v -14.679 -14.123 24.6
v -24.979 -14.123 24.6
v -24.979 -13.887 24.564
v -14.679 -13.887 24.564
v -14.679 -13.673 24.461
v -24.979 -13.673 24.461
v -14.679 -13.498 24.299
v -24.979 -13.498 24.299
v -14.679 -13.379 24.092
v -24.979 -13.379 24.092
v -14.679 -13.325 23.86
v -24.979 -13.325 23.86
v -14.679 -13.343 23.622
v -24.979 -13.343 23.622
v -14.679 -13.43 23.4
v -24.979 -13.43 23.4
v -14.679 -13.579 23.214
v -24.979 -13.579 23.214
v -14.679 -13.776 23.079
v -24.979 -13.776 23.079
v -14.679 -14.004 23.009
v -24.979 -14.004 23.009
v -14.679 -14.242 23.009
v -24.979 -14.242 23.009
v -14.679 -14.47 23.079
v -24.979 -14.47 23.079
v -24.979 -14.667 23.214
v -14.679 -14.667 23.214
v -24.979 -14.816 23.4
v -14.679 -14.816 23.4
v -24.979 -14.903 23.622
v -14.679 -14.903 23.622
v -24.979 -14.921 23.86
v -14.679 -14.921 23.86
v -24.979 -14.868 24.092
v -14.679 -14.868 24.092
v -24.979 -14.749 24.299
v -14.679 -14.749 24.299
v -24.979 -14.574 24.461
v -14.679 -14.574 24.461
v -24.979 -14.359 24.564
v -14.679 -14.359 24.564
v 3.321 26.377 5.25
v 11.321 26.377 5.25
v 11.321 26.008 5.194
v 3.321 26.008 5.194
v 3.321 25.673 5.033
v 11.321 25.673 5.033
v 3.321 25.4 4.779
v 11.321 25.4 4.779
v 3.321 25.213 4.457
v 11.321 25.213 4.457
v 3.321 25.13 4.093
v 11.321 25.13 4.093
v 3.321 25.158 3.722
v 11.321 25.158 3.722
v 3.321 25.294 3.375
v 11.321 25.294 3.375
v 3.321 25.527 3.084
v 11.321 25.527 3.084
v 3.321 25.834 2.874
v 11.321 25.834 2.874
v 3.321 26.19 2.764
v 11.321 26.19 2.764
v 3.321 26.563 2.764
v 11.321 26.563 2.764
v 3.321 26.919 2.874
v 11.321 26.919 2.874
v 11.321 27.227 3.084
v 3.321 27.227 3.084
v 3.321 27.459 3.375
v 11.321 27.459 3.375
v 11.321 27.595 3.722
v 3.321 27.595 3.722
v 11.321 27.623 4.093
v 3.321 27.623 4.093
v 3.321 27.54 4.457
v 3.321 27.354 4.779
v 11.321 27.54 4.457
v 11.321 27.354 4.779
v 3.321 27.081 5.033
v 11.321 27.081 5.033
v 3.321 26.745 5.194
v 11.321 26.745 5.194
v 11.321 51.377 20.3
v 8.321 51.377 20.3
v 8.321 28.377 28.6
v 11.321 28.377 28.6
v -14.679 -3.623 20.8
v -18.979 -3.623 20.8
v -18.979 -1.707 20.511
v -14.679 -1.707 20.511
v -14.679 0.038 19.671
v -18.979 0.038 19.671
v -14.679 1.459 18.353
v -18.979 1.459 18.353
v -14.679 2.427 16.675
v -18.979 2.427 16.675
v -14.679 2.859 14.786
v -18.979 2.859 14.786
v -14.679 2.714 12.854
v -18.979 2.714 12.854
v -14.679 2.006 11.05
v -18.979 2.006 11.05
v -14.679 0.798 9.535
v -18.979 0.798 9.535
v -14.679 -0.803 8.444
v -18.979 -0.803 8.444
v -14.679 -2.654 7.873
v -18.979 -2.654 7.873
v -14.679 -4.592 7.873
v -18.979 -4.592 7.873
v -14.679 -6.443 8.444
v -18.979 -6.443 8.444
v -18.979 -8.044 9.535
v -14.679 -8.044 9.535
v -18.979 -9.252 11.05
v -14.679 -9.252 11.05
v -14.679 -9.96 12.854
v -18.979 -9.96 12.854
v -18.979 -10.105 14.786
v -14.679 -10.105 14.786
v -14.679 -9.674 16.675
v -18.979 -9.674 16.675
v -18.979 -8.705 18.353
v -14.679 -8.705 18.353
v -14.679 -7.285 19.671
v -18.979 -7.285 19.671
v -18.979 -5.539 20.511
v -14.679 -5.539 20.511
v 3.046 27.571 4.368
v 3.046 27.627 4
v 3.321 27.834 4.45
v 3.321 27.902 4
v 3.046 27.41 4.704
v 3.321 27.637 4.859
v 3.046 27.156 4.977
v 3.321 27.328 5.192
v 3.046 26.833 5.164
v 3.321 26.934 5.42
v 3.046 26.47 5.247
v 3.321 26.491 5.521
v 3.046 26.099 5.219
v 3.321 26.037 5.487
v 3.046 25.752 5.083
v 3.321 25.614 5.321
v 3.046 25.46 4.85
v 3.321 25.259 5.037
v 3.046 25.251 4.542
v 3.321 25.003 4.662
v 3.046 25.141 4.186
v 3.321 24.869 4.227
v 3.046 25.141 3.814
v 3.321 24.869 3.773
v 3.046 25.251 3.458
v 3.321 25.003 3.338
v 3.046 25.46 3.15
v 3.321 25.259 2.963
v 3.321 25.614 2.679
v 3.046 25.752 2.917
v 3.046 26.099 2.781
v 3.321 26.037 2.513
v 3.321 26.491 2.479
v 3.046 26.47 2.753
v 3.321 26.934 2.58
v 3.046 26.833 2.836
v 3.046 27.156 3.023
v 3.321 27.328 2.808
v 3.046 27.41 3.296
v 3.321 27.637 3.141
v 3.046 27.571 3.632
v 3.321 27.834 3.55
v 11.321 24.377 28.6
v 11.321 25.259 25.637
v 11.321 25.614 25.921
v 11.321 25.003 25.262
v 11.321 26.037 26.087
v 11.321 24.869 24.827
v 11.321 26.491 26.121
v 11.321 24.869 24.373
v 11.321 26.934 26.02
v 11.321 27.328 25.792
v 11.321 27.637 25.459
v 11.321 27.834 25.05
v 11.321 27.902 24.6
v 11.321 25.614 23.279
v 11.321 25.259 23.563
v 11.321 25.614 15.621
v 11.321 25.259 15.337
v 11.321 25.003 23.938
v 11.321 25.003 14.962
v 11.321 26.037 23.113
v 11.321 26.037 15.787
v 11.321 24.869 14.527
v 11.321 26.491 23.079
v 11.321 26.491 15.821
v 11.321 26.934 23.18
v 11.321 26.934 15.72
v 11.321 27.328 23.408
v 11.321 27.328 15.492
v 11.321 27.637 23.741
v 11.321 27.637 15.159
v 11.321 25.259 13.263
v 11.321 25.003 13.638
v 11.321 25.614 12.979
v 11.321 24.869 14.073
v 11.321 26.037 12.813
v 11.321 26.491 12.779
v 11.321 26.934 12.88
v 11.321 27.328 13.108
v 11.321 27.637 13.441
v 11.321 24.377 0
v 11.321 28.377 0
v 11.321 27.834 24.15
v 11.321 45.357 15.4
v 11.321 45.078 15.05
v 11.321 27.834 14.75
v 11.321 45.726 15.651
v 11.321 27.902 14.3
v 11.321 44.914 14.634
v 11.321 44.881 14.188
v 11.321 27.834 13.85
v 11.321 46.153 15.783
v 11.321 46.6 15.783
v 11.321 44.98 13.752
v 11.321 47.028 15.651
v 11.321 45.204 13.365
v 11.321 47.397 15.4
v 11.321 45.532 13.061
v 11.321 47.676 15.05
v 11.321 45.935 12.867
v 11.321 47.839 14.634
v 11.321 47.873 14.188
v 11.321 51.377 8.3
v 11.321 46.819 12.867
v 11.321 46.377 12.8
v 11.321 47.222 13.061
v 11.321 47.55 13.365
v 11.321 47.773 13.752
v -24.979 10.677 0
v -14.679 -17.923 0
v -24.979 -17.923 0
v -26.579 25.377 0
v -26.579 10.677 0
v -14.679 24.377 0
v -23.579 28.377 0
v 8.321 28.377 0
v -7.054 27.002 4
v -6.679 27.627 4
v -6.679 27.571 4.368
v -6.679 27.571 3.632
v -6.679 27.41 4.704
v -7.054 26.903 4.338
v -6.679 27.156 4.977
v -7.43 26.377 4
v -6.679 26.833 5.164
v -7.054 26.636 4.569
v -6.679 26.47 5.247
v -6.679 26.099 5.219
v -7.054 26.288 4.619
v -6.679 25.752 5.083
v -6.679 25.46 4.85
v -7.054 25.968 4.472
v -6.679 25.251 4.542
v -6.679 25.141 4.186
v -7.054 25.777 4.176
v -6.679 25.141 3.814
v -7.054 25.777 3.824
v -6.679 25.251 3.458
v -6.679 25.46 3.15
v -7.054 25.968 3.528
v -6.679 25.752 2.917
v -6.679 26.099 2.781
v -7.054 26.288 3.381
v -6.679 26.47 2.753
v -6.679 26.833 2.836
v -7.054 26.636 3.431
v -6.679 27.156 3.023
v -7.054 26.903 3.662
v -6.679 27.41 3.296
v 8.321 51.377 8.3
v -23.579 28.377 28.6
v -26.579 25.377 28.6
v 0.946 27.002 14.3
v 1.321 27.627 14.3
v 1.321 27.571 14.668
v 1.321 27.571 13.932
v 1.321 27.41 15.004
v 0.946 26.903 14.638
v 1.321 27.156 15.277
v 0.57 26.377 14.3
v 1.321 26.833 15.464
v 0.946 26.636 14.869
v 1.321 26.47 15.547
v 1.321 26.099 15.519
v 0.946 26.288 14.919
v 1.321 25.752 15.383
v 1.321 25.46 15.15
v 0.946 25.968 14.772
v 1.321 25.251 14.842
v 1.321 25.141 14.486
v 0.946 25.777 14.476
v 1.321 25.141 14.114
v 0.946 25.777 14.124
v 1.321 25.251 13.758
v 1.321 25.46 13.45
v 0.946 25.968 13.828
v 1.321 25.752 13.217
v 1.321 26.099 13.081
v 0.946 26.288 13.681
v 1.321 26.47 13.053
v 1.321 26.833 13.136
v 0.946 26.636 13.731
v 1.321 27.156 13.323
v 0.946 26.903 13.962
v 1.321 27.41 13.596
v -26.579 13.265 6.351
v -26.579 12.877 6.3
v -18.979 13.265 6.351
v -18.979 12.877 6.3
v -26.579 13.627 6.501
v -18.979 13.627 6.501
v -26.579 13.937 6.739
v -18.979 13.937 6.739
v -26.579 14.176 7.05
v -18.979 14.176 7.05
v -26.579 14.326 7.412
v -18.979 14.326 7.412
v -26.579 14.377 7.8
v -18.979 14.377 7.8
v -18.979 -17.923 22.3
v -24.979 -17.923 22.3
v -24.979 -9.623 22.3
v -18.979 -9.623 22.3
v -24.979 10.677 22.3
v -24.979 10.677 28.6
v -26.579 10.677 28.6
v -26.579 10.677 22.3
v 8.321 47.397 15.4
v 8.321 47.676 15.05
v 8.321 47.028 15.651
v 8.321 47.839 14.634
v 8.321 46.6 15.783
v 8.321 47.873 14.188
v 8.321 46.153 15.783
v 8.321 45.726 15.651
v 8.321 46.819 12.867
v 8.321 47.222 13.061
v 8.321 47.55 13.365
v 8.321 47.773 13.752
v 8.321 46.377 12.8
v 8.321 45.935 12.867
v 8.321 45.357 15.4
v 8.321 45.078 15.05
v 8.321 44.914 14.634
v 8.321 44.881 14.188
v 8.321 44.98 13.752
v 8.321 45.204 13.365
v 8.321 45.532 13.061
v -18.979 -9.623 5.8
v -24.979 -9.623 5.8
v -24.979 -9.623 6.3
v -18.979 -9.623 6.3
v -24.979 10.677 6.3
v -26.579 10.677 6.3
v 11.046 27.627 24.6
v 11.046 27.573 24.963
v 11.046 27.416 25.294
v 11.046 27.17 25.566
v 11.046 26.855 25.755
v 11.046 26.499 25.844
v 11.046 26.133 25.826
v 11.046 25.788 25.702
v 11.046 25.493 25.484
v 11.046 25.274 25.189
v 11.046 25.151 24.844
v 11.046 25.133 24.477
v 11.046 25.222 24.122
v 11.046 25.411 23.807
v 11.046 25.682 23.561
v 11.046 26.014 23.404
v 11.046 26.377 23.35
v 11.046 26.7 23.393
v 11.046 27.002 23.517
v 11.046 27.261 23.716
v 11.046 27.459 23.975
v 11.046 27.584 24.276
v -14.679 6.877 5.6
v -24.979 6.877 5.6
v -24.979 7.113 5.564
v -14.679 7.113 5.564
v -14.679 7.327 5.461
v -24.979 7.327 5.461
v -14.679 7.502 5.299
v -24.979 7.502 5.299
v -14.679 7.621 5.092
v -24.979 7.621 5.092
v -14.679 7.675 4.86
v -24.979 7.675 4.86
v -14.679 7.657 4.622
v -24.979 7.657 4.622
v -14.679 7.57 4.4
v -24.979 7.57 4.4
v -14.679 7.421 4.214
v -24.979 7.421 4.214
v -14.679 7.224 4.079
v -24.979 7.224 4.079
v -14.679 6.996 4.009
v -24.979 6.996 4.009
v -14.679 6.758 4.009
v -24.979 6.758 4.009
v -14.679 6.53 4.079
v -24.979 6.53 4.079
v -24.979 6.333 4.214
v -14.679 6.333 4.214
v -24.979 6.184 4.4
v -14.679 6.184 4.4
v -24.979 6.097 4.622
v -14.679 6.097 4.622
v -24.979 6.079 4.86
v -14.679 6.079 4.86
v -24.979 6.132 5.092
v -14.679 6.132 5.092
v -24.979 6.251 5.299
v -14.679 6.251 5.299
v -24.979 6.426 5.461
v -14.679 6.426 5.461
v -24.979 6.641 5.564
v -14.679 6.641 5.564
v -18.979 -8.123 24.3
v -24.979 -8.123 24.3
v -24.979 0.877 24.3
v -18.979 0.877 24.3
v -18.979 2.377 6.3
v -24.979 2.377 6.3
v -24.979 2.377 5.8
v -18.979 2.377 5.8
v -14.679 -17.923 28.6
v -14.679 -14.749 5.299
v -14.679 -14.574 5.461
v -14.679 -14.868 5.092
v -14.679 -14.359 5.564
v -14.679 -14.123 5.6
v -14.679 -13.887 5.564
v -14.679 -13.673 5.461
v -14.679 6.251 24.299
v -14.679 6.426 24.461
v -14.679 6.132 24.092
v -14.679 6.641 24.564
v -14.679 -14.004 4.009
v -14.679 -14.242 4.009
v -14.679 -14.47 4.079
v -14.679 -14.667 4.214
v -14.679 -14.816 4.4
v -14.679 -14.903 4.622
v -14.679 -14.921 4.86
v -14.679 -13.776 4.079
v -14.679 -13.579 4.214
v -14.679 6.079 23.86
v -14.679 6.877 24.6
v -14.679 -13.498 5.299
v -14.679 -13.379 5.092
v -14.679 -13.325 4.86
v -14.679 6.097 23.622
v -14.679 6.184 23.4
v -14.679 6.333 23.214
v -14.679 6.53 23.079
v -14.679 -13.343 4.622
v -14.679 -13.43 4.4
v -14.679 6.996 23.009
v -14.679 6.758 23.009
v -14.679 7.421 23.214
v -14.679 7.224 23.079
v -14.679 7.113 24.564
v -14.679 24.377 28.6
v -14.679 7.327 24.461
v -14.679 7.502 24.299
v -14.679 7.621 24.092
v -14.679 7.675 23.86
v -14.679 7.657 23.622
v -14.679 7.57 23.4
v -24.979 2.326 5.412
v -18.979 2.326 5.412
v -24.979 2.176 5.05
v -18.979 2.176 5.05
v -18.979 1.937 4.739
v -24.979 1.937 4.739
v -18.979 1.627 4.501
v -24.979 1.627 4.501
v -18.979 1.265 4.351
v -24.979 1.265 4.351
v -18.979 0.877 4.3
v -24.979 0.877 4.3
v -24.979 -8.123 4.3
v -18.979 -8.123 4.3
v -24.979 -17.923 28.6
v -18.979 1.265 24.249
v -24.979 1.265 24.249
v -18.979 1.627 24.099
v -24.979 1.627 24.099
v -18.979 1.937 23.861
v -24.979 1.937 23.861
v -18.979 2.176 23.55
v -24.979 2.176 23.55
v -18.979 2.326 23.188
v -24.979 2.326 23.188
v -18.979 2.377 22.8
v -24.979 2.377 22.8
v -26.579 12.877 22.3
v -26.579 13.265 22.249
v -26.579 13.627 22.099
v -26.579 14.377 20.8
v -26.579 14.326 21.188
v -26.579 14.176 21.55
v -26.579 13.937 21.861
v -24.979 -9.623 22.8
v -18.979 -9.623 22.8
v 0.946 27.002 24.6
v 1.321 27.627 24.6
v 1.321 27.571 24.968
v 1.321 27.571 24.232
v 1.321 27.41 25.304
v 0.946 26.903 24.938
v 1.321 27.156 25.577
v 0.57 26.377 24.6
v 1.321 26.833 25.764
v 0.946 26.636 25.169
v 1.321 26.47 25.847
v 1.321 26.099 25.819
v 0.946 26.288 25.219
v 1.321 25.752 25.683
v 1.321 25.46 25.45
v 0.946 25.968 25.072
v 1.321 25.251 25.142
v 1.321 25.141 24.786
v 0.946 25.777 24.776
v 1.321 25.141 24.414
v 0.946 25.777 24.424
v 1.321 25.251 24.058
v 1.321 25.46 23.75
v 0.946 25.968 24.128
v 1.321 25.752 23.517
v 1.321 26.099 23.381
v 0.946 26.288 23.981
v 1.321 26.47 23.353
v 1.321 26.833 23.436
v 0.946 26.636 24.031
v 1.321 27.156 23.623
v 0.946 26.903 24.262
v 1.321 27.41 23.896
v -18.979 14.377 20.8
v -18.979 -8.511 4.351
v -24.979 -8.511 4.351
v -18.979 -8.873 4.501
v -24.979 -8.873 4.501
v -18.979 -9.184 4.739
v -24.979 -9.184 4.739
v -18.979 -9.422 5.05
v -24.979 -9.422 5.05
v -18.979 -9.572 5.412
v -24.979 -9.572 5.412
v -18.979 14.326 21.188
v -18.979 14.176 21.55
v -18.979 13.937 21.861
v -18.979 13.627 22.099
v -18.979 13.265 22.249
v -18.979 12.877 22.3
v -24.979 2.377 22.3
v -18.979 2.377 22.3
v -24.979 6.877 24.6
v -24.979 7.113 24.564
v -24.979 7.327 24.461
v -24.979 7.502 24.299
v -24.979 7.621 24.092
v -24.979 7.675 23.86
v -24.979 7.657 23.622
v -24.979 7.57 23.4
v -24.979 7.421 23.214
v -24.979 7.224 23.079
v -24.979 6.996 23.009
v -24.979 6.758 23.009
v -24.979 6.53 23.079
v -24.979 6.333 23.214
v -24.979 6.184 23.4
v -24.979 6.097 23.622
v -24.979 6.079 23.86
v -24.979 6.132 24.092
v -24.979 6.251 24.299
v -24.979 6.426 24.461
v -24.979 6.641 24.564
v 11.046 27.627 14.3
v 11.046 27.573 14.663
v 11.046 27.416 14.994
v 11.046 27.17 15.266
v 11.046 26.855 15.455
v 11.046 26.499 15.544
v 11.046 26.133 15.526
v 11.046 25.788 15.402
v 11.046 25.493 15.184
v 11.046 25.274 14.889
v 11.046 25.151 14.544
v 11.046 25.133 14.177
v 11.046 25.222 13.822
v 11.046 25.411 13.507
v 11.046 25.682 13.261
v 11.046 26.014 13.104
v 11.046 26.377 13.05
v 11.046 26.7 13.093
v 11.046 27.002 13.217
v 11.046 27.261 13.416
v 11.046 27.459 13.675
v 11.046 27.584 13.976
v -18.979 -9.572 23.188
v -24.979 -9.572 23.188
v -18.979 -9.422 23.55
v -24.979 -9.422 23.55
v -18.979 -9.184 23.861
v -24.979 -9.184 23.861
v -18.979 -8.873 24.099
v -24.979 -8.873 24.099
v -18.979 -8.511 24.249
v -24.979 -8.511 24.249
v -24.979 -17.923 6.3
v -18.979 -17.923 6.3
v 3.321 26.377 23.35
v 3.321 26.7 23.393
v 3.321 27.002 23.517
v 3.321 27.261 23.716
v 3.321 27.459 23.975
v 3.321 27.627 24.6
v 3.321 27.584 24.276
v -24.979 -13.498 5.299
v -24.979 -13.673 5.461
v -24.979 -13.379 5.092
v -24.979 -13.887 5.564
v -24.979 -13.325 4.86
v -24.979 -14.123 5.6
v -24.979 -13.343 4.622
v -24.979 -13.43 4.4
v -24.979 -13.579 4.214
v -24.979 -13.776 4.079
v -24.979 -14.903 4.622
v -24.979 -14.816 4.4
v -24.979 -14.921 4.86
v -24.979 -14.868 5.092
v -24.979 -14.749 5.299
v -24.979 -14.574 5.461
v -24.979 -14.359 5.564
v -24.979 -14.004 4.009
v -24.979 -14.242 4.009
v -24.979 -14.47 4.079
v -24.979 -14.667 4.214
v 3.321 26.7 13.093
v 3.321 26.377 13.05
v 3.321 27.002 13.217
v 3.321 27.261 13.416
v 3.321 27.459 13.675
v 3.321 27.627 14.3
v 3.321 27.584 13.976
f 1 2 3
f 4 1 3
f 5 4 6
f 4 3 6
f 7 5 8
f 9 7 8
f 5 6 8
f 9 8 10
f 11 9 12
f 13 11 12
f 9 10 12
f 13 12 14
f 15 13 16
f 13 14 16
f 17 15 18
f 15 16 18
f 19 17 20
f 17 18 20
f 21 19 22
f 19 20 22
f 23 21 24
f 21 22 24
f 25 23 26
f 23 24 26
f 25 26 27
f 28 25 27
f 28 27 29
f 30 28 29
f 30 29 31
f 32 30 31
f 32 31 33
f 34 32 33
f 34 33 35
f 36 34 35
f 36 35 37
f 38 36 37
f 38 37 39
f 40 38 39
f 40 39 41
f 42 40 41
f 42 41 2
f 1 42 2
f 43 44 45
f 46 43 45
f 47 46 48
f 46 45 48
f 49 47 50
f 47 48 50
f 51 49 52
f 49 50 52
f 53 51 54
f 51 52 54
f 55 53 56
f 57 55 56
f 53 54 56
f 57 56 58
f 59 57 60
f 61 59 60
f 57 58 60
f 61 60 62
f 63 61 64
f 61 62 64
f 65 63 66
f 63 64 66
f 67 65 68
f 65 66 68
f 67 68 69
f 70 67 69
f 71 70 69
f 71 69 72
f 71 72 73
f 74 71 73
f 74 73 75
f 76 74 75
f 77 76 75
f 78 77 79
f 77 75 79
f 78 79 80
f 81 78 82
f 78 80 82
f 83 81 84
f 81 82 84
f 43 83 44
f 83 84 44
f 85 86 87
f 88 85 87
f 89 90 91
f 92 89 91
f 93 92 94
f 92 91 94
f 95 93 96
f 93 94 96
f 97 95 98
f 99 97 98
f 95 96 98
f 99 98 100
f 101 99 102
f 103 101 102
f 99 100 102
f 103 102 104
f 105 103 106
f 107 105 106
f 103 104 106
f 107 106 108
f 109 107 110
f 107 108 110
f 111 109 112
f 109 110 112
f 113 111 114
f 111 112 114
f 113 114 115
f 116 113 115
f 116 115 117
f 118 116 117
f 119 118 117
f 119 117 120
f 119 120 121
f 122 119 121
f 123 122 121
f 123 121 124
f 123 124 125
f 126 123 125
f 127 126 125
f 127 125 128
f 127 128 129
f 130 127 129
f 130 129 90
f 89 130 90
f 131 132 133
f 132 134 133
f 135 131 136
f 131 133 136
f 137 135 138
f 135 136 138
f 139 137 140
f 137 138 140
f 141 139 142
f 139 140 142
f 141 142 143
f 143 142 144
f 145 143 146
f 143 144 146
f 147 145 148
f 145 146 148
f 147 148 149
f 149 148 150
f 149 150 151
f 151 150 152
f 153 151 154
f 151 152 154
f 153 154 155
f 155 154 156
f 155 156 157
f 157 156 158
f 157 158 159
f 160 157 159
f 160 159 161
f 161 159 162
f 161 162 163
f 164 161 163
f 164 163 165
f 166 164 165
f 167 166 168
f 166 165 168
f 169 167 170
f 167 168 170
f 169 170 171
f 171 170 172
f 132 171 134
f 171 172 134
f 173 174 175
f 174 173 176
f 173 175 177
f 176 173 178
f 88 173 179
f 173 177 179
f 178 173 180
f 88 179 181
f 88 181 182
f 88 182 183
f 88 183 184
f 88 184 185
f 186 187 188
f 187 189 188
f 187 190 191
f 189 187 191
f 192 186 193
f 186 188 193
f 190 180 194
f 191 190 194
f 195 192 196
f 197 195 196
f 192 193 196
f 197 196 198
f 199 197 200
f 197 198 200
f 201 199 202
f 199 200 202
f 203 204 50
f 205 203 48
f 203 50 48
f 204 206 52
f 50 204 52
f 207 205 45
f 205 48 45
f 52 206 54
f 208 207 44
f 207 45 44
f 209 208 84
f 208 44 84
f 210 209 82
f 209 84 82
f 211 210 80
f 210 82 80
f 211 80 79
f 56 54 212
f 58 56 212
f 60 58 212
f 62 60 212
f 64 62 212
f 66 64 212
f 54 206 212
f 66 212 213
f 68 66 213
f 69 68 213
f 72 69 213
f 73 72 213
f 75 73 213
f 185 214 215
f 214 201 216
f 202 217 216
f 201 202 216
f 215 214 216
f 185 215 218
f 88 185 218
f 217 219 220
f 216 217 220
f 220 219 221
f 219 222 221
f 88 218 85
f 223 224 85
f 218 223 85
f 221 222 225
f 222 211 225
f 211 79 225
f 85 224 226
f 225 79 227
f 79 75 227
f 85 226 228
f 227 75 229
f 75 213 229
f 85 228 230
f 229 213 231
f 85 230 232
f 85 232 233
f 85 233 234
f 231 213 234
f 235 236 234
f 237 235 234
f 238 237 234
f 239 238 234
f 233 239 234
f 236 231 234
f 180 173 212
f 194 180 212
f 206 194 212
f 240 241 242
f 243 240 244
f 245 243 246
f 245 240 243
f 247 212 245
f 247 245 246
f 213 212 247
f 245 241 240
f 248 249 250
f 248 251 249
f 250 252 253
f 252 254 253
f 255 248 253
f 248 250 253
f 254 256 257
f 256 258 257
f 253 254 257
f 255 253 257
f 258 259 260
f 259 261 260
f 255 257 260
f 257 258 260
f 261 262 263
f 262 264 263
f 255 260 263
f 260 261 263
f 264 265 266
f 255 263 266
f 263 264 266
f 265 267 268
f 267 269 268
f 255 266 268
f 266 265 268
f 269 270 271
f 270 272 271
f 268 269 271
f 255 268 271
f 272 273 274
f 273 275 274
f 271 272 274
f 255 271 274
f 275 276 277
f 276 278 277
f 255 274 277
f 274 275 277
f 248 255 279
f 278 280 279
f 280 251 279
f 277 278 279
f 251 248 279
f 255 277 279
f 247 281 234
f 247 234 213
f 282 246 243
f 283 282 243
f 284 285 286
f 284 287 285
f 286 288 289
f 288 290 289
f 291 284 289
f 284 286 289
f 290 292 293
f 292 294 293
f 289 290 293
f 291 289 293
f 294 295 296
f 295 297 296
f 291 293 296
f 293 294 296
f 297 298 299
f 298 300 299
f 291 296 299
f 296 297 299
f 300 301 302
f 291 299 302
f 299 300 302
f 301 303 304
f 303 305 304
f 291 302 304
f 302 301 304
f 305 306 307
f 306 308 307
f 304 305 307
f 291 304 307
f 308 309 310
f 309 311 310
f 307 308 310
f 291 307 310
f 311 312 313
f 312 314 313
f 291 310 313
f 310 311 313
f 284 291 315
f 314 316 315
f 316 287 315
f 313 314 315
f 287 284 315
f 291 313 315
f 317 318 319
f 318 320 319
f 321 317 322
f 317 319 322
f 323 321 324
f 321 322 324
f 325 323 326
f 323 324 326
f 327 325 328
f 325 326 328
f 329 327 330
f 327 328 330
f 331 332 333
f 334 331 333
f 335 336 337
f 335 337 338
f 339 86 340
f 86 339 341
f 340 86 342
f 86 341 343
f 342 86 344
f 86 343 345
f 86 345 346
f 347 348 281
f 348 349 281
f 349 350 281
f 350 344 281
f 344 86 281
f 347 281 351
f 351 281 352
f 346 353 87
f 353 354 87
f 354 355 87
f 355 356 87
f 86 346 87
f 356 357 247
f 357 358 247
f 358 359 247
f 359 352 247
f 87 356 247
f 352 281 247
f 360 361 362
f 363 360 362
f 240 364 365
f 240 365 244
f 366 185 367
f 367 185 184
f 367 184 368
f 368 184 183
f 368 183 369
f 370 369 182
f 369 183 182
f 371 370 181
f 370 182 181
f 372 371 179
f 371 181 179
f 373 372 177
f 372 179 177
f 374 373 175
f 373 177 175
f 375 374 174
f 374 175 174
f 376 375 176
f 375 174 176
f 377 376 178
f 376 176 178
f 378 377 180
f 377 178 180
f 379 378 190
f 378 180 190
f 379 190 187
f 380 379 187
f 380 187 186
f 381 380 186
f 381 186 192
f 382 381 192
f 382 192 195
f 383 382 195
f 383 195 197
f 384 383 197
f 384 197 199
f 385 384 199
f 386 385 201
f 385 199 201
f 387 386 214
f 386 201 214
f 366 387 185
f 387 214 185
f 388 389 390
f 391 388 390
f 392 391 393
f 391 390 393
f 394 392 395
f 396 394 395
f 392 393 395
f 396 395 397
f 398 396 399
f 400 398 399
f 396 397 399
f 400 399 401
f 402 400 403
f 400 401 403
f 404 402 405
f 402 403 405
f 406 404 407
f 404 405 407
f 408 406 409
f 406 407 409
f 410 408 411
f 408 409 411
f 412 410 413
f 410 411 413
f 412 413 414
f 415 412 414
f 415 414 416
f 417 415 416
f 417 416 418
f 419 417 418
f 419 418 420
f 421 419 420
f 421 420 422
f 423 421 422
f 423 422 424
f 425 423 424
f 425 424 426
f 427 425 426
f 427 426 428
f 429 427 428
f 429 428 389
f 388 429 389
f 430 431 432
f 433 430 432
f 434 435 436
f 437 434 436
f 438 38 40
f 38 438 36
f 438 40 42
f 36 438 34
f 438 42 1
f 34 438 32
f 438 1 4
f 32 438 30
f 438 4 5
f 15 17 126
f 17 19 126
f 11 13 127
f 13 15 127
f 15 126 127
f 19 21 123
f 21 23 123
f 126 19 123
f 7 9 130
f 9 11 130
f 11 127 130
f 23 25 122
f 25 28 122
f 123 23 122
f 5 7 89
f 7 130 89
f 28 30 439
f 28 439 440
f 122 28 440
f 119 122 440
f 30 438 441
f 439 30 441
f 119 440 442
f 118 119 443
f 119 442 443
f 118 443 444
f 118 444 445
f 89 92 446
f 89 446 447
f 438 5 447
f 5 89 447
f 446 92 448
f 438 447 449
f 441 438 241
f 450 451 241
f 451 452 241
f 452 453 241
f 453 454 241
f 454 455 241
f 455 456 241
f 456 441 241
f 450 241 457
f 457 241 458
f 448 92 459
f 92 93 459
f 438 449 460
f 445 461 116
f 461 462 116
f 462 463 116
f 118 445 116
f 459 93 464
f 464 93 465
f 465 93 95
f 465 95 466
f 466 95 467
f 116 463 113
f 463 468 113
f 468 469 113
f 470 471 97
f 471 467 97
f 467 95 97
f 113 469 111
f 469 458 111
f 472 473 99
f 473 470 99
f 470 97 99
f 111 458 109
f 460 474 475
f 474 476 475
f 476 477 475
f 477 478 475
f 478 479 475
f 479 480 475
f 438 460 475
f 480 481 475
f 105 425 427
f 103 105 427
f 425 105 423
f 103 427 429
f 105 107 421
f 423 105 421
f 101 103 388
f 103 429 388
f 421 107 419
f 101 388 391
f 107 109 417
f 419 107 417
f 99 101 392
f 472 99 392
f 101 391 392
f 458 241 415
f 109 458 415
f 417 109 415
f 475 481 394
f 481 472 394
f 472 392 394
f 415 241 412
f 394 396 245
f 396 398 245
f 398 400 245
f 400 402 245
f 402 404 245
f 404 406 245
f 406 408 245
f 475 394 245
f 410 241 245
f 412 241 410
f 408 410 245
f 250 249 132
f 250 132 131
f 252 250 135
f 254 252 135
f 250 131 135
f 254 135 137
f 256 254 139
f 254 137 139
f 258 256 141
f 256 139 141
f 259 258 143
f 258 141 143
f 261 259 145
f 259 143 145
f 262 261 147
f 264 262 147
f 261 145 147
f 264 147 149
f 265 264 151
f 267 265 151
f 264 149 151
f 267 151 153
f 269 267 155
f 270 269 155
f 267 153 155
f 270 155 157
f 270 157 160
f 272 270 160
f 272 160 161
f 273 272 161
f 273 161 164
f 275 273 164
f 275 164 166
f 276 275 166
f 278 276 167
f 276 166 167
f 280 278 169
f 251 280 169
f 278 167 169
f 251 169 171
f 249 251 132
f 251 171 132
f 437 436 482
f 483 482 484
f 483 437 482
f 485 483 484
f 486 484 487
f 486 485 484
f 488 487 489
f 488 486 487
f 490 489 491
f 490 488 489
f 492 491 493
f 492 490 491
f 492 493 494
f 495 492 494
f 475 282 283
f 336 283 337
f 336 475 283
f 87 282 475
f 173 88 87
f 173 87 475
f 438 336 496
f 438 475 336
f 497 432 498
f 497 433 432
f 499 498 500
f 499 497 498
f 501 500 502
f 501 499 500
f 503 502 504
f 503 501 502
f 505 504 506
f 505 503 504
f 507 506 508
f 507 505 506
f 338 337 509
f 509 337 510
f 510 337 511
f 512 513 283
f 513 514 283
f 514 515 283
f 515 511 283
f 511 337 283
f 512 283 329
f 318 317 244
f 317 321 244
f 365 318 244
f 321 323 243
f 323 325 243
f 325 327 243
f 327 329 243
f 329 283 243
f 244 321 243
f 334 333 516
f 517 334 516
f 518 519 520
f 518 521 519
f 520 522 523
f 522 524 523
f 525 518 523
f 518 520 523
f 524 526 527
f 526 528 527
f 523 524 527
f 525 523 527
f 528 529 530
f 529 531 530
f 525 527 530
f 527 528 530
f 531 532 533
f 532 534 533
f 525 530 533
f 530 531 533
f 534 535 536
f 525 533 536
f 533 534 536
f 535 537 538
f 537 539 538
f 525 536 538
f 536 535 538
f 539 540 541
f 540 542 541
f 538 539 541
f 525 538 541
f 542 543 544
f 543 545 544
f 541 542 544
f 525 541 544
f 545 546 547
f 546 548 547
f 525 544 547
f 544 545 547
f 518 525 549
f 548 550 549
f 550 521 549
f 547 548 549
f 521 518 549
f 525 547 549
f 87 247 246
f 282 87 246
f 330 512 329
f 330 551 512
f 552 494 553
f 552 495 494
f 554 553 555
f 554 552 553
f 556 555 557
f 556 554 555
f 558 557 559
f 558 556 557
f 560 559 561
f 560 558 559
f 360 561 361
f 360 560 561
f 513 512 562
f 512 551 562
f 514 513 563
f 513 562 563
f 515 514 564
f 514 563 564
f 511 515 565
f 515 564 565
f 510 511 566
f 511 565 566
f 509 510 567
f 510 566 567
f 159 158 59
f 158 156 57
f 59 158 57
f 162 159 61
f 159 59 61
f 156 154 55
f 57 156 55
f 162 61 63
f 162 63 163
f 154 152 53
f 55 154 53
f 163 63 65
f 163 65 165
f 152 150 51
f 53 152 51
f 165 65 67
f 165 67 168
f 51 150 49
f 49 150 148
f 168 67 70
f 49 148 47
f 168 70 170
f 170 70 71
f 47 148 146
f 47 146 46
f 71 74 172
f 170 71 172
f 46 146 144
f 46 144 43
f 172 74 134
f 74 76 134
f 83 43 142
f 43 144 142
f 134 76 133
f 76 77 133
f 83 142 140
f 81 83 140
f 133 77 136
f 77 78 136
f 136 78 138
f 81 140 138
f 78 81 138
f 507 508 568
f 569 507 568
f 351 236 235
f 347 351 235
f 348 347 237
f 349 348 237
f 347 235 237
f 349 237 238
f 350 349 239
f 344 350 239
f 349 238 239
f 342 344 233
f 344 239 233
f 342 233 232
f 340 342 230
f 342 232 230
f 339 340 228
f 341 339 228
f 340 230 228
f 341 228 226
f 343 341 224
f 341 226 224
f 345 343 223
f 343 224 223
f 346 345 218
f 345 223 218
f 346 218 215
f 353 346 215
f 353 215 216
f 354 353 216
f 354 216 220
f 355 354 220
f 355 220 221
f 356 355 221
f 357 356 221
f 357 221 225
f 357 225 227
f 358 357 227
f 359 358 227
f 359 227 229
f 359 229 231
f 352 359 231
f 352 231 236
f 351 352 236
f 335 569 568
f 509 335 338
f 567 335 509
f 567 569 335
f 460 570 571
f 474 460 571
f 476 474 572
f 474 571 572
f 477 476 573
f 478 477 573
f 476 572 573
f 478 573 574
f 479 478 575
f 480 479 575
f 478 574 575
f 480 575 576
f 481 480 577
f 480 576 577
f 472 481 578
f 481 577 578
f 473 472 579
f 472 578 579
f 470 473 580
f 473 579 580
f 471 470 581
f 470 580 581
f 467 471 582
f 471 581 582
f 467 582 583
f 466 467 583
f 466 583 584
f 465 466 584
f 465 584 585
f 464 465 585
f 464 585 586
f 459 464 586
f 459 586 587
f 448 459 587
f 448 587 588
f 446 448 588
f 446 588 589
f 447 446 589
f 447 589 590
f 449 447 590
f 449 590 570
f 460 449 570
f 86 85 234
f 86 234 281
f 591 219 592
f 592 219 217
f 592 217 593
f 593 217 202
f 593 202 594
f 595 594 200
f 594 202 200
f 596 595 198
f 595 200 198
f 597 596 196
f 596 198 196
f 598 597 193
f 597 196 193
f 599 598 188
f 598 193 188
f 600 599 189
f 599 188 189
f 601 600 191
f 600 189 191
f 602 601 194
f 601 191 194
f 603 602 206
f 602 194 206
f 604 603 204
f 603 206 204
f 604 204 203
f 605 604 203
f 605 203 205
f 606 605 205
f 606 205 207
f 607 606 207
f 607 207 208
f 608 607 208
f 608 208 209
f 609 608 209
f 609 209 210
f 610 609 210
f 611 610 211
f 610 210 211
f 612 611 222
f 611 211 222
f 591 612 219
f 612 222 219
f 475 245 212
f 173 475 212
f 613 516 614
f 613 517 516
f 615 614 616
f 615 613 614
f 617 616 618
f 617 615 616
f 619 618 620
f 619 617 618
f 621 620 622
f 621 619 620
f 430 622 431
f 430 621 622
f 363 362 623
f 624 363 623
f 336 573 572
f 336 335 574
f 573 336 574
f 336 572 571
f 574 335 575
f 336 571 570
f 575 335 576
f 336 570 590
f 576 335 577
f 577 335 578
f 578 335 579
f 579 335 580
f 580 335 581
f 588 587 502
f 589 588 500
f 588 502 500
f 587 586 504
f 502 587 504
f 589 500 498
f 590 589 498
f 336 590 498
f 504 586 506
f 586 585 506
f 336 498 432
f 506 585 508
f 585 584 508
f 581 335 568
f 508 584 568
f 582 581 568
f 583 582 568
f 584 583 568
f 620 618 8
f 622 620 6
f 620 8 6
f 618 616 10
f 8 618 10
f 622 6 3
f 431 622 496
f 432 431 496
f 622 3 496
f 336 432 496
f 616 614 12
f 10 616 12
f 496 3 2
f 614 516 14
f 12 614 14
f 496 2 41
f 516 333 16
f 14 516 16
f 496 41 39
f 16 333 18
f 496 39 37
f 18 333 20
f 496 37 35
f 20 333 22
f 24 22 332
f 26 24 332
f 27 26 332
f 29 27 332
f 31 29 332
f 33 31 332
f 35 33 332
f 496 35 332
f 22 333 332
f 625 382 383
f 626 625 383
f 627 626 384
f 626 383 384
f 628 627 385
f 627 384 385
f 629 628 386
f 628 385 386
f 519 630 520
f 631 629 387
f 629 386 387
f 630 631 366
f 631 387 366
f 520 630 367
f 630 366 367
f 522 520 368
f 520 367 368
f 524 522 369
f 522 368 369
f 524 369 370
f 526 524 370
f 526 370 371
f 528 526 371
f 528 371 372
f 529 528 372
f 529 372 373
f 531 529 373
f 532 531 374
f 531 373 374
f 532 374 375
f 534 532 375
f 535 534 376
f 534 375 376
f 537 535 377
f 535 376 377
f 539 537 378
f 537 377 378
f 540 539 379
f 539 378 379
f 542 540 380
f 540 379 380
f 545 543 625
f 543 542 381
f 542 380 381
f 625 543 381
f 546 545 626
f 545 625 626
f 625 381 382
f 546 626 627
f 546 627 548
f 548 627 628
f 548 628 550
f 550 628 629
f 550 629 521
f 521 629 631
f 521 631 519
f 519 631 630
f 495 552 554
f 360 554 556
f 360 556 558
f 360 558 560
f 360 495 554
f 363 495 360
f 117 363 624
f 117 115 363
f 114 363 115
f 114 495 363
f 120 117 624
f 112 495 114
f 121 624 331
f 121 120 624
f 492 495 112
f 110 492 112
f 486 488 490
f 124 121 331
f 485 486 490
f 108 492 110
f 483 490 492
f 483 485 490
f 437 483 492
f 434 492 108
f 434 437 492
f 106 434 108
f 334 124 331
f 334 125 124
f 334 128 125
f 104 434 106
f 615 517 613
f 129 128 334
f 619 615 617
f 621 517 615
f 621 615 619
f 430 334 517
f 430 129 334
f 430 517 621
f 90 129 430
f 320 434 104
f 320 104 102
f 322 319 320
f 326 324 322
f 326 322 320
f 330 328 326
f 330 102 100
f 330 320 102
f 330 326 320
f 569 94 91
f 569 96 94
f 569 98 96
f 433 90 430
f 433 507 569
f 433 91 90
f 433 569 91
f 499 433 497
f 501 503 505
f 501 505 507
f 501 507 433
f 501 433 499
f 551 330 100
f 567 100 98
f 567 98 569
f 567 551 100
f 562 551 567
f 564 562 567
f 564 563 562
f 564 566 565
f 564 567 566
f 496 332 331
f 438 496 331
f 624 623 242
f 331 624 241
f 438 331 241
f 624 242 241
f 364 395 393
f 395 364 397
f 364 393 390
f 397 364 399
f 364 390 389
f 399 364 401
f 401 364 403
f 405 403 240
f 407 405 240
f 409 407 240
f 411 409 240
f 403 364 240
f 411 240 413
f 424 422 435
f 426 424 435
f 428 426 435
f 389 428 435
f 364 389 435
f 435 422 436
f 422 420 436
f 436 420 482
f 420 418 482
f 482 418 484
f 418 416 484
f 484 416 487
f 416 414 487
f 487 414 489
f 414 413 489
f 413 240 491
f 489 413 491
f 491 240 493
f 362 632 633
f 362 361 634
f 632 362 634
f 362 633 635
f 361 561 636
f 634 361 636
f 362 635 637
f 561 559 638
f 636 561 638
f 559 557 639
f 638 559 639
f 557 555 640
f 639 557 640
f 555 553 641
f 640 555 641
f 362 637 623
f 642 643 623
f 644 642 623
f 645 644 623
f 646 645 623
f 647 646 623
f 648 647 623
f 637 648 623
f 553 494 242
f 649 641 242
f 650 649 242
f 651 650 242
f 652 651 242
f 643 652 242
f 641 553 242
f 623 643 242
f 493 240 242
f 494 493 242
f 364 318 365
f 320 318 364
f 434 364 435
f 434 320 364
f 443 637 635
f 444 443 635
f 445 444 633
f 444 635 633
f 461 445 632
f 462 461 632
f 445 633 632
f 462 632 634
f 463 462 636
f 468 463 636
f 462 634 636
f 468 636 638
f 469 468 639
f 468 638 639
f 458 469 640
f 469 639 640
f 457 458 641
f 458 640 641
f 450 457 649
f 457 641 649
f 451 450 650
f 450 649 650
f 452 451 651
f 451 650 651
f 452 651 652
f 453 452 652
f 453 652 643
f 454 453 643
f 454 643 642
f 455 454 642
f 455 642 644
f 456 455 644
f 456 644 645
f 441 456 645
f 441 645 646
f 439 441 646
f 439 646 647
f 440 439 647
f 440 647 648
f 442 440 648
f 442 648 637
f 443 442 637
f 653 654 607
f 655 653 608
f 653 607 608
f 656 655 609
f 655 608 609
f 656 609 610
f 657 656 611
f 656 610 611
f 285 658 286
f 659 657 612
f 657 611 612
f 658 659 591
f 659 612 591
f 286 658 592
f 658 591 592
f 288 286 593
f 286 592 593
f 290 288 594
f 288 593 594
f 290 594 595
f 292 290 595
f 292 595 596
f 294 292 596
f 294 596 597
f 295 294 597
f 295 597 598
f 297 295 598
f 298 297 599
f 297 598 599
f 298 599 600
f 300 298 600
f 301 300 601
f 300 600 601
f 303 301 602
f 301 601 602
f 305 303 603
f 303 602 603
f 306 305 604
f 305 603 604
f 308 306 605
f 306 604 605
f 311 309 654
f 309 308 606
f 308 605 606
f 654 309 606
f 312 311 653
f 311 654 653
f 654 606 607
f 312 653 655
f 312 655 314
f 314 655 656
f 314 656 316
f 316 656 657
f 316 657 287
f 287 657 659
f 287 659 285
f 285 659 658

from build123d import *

# Parameters (mm, degrees)
EXTRUDE_1_DEPTH     = 28.6
SKETCH_1_R          = 6.5
CUT_EXTRUDE_1_DEPTH = 70.103002637
SKETCH_2_R          = 0.8
CUT_EXTRUDE_2_DEPTH = 70.103002637
CUT_EXTRUDE_4_DEPTH = 6
EXTRUDE_2_DEPTH     = 1.6
FILLET_1_R          = 1.5
FILLET_2_R          = 1.5
SKETCH_6_R          = 1.5
SKETCH_6_R_2        = 1.25
CUT_EXTRUDE_7_DEPTH = 8
CUT_EXTRUDE_8_DEPTH = 8


with BuildPart() as part:
    # Model → 凸台-拉伸1 (new body)
    with BuildSketch(Plane.XY):
        Polygon((-24.978787879, -17.92321671), (-14.678787879, -17.92321671), (-14.678787879, 24.376794113), (11.321212121, 24.376794113), (11.321212121, 51.376794114), (8.321212121, 51.376794114), (8.321212121, 28.376794114), (-23.578787879, 28.376794114), (-26.578787879, 25.376794114), (-26.578787879, 24.376794113), (-24.978787879, 24.376794113), align=None)
    extrude(amount=EXTRUDE_1_DEPTH)

    # 草图1 → 切除-拉伸1 (cut, through all)
    with BuildSketch(Plane.ZY.offset(24.978787879)):
        with Locations((14.3, -3.623205886)):
            Circle(SKETCH_1_R)
    extrude(amount=-CUT_EXTRUDE_1_DEPTH, mode=Mode.SUBTRACT)

    # 草图2 → 切除-拉伸2 (cut, through all)
    with BuildSketch(Plane.ZY.offset(24.978787879)):
        with Locations((23.8, 6.876794114)):
            Circle(SKETCH_2_R)
        with Locations((23.8, -14.123205886)):
            Circle(SKETCH_2_R)
        with Locations((4.8, -14.123205886)):
            Circle(SKETCH_2_R)
        with Locations((4.8, 6.876794114)):
            Circle(SKETCH_2_R)
    extrude(amount=-CUT_EXTRUDE_2_DEPTH, mode=Mode.SUBTRACT)

    # 草图3 → 切除-拉伸4 (cut)
    with BuildSketch(Plane.ZY.offset(24.978787879)):
        Polygon((6.3, -35.623205886), (22.3, -35.623205886), (22.3, -9.623205886), (24.3, -9.623205886), (24.3, 2.376794114), (22.3, 2.376794114), (22.3, 14.376794114), (6.3, 14.376794114), (6.3, 2.376794114), (4.3, 2.376794114), (4.3, -9.623205886), (6.3, -9.623205886), align=None)
    extrude(amount=-CUT_EXTRUDE_4_DEPTH, mode=Mode.SUBTRACT)

    # 草图5 → 凸台-拉伸2 (add, through all)
    with BuildSketch(Plane.ZY.offset(24.978787879)):
        Polygon((0, 24.376794113), (28.6, 24.376794113), (28.6, 10.676804938), (22.3, 10.676804938), (22.3, 14.376794114), (6.3, 14.376794114), (6.3, 10.676804938), (0, 10.676804938), align=None)
    extrude(amount=EXTRUDE_2_DEPTH)

    # 圆角1
    fillet_1_edges = [part.edges().sort_by_distance(p)[0] for p in [
        (-21.978787879, -9.623205886, 4.3),
        (-21.978787879, 2.376794114, 4.3),
        (-21.978787879, 2.376794114, 24.3),
        (-21.978787879, -9.623205886, 24.3),
    ]]
    fillet(fillet_1_edges, radius=FILLET_1_R)

    # 圆角2
    fillet_2_edges = [part.edges().sort_by_distance(p)[0] for p in [
        (-22.778787879, 14.376794114, 6.3),
        (-22.778787879, 14.376794114, 22.3),
    ]]
    fillet(fillet_2_edges, radius=FILLET_2_R)

    # 草图6 → 切除-拉伸7 (cut)
    with BuildSketch(Plane(origin=(11.321212121, 0, 0), x_dir=(0, 0, -1), z_dir=(1, 0, 0))):
        with Locations((-14.3, 46.376794114)):
            Circle(SKETCH_6_R)
        with Locations((-14.3, 26.376794113)):
            Circle(SKETCH_6_R_2)
        with Locations((-24.6, 26.376794113)):
            Circle(SKETCH_6_R_2)
        with Locations(Location((-4, 26.376794113, 0), (0, 0, 180))):
            Circle(SKETCH_6_R_2)
    extrude(amount=-CUT_EXTRUDE_7_DEPTH, mode=Mode.SUBTRACT)

    # 草图8 → 切除-拉伸8 (cut)
    with BuildSketch(Plane.ZY.offset(-8.321212121)):
        Polygon((8.3, 51.376794114), (0, 28.376794114), (-7.058670234, 55.306274643), align=None)
        Polygon((28.6, 28.376794114), (35.658670234, 55.306274643), (20.3, 51.376794114), align=None)
    extrude(amount=-CUT_EXTRUDE_8_DEPTH, mode=Mode.SUBTRACT)

    # M3 螺纹孔1: read off the stored shape, not the designer's step
    # M3 螺纹孔1 outline → M3 螺纹孔1 (revolve, cut)
    with BuildSketch(Plane(origin=(0, 26.376794113, 4), x_dir=(0, 1, 0), z_dir=(0, 0, -1))):
        Polygon((0, -7.429863653), (1.25, -6.678787879), (1.25, 3.046212121), (1.525, 3.321212121), (0, 3.321212121), align=None)
    revolve(axis=Axis((0, 26.376794113, 4), (1, 0, 0)), mode=Mode.SUBTRACT)

    # Hole Wizard M3 _1 2 outline → Hole Wizard M3 _1 2 (revolve, cut)
    with BuildSketch(Plane(origin=(0, 26.376794113, 14.3), x_dir=(0, 1, 0), z_dir=(0, 0, -1))):
        Polygon((1.25, 11.321212121), (1.25, 11.046212121), (1.525, 11.321212121), align=None)
        Polygon((1.25, 1.321212121), (1.25, 11.046212121), (0, 11.046212121), (0, 0.570136347), align=None)
    revolve(axis=Axis((0, 26.376794113, 14.3), (1, 0, 0)), mode=Mode.SUBTRACT)

    # Hole Wizard M3 _1 3 outline → Hole Wizard M3 _1 3 (revolve, cut)
    with BuildSketch(Plane(origin=(0, 26.376794113, 24.6), x_dir=(0, 1, 0), z_dir=(0, 0, -1))):
        Polygon((1.25, 11.321212121), (1.25, 11.046212121), (1.525, 11.321212121), align=None)
        Polygon((1.25, 1.321212121), (1.25, 3.321212121), (0, 3.321212121), (0, 0.570136347), align=None)
    revolve(axis=Axis((0, 26.376794113, 24.6), (1, 0, 0)), mode=Mode.SUBTRACT)


solid = part.part
